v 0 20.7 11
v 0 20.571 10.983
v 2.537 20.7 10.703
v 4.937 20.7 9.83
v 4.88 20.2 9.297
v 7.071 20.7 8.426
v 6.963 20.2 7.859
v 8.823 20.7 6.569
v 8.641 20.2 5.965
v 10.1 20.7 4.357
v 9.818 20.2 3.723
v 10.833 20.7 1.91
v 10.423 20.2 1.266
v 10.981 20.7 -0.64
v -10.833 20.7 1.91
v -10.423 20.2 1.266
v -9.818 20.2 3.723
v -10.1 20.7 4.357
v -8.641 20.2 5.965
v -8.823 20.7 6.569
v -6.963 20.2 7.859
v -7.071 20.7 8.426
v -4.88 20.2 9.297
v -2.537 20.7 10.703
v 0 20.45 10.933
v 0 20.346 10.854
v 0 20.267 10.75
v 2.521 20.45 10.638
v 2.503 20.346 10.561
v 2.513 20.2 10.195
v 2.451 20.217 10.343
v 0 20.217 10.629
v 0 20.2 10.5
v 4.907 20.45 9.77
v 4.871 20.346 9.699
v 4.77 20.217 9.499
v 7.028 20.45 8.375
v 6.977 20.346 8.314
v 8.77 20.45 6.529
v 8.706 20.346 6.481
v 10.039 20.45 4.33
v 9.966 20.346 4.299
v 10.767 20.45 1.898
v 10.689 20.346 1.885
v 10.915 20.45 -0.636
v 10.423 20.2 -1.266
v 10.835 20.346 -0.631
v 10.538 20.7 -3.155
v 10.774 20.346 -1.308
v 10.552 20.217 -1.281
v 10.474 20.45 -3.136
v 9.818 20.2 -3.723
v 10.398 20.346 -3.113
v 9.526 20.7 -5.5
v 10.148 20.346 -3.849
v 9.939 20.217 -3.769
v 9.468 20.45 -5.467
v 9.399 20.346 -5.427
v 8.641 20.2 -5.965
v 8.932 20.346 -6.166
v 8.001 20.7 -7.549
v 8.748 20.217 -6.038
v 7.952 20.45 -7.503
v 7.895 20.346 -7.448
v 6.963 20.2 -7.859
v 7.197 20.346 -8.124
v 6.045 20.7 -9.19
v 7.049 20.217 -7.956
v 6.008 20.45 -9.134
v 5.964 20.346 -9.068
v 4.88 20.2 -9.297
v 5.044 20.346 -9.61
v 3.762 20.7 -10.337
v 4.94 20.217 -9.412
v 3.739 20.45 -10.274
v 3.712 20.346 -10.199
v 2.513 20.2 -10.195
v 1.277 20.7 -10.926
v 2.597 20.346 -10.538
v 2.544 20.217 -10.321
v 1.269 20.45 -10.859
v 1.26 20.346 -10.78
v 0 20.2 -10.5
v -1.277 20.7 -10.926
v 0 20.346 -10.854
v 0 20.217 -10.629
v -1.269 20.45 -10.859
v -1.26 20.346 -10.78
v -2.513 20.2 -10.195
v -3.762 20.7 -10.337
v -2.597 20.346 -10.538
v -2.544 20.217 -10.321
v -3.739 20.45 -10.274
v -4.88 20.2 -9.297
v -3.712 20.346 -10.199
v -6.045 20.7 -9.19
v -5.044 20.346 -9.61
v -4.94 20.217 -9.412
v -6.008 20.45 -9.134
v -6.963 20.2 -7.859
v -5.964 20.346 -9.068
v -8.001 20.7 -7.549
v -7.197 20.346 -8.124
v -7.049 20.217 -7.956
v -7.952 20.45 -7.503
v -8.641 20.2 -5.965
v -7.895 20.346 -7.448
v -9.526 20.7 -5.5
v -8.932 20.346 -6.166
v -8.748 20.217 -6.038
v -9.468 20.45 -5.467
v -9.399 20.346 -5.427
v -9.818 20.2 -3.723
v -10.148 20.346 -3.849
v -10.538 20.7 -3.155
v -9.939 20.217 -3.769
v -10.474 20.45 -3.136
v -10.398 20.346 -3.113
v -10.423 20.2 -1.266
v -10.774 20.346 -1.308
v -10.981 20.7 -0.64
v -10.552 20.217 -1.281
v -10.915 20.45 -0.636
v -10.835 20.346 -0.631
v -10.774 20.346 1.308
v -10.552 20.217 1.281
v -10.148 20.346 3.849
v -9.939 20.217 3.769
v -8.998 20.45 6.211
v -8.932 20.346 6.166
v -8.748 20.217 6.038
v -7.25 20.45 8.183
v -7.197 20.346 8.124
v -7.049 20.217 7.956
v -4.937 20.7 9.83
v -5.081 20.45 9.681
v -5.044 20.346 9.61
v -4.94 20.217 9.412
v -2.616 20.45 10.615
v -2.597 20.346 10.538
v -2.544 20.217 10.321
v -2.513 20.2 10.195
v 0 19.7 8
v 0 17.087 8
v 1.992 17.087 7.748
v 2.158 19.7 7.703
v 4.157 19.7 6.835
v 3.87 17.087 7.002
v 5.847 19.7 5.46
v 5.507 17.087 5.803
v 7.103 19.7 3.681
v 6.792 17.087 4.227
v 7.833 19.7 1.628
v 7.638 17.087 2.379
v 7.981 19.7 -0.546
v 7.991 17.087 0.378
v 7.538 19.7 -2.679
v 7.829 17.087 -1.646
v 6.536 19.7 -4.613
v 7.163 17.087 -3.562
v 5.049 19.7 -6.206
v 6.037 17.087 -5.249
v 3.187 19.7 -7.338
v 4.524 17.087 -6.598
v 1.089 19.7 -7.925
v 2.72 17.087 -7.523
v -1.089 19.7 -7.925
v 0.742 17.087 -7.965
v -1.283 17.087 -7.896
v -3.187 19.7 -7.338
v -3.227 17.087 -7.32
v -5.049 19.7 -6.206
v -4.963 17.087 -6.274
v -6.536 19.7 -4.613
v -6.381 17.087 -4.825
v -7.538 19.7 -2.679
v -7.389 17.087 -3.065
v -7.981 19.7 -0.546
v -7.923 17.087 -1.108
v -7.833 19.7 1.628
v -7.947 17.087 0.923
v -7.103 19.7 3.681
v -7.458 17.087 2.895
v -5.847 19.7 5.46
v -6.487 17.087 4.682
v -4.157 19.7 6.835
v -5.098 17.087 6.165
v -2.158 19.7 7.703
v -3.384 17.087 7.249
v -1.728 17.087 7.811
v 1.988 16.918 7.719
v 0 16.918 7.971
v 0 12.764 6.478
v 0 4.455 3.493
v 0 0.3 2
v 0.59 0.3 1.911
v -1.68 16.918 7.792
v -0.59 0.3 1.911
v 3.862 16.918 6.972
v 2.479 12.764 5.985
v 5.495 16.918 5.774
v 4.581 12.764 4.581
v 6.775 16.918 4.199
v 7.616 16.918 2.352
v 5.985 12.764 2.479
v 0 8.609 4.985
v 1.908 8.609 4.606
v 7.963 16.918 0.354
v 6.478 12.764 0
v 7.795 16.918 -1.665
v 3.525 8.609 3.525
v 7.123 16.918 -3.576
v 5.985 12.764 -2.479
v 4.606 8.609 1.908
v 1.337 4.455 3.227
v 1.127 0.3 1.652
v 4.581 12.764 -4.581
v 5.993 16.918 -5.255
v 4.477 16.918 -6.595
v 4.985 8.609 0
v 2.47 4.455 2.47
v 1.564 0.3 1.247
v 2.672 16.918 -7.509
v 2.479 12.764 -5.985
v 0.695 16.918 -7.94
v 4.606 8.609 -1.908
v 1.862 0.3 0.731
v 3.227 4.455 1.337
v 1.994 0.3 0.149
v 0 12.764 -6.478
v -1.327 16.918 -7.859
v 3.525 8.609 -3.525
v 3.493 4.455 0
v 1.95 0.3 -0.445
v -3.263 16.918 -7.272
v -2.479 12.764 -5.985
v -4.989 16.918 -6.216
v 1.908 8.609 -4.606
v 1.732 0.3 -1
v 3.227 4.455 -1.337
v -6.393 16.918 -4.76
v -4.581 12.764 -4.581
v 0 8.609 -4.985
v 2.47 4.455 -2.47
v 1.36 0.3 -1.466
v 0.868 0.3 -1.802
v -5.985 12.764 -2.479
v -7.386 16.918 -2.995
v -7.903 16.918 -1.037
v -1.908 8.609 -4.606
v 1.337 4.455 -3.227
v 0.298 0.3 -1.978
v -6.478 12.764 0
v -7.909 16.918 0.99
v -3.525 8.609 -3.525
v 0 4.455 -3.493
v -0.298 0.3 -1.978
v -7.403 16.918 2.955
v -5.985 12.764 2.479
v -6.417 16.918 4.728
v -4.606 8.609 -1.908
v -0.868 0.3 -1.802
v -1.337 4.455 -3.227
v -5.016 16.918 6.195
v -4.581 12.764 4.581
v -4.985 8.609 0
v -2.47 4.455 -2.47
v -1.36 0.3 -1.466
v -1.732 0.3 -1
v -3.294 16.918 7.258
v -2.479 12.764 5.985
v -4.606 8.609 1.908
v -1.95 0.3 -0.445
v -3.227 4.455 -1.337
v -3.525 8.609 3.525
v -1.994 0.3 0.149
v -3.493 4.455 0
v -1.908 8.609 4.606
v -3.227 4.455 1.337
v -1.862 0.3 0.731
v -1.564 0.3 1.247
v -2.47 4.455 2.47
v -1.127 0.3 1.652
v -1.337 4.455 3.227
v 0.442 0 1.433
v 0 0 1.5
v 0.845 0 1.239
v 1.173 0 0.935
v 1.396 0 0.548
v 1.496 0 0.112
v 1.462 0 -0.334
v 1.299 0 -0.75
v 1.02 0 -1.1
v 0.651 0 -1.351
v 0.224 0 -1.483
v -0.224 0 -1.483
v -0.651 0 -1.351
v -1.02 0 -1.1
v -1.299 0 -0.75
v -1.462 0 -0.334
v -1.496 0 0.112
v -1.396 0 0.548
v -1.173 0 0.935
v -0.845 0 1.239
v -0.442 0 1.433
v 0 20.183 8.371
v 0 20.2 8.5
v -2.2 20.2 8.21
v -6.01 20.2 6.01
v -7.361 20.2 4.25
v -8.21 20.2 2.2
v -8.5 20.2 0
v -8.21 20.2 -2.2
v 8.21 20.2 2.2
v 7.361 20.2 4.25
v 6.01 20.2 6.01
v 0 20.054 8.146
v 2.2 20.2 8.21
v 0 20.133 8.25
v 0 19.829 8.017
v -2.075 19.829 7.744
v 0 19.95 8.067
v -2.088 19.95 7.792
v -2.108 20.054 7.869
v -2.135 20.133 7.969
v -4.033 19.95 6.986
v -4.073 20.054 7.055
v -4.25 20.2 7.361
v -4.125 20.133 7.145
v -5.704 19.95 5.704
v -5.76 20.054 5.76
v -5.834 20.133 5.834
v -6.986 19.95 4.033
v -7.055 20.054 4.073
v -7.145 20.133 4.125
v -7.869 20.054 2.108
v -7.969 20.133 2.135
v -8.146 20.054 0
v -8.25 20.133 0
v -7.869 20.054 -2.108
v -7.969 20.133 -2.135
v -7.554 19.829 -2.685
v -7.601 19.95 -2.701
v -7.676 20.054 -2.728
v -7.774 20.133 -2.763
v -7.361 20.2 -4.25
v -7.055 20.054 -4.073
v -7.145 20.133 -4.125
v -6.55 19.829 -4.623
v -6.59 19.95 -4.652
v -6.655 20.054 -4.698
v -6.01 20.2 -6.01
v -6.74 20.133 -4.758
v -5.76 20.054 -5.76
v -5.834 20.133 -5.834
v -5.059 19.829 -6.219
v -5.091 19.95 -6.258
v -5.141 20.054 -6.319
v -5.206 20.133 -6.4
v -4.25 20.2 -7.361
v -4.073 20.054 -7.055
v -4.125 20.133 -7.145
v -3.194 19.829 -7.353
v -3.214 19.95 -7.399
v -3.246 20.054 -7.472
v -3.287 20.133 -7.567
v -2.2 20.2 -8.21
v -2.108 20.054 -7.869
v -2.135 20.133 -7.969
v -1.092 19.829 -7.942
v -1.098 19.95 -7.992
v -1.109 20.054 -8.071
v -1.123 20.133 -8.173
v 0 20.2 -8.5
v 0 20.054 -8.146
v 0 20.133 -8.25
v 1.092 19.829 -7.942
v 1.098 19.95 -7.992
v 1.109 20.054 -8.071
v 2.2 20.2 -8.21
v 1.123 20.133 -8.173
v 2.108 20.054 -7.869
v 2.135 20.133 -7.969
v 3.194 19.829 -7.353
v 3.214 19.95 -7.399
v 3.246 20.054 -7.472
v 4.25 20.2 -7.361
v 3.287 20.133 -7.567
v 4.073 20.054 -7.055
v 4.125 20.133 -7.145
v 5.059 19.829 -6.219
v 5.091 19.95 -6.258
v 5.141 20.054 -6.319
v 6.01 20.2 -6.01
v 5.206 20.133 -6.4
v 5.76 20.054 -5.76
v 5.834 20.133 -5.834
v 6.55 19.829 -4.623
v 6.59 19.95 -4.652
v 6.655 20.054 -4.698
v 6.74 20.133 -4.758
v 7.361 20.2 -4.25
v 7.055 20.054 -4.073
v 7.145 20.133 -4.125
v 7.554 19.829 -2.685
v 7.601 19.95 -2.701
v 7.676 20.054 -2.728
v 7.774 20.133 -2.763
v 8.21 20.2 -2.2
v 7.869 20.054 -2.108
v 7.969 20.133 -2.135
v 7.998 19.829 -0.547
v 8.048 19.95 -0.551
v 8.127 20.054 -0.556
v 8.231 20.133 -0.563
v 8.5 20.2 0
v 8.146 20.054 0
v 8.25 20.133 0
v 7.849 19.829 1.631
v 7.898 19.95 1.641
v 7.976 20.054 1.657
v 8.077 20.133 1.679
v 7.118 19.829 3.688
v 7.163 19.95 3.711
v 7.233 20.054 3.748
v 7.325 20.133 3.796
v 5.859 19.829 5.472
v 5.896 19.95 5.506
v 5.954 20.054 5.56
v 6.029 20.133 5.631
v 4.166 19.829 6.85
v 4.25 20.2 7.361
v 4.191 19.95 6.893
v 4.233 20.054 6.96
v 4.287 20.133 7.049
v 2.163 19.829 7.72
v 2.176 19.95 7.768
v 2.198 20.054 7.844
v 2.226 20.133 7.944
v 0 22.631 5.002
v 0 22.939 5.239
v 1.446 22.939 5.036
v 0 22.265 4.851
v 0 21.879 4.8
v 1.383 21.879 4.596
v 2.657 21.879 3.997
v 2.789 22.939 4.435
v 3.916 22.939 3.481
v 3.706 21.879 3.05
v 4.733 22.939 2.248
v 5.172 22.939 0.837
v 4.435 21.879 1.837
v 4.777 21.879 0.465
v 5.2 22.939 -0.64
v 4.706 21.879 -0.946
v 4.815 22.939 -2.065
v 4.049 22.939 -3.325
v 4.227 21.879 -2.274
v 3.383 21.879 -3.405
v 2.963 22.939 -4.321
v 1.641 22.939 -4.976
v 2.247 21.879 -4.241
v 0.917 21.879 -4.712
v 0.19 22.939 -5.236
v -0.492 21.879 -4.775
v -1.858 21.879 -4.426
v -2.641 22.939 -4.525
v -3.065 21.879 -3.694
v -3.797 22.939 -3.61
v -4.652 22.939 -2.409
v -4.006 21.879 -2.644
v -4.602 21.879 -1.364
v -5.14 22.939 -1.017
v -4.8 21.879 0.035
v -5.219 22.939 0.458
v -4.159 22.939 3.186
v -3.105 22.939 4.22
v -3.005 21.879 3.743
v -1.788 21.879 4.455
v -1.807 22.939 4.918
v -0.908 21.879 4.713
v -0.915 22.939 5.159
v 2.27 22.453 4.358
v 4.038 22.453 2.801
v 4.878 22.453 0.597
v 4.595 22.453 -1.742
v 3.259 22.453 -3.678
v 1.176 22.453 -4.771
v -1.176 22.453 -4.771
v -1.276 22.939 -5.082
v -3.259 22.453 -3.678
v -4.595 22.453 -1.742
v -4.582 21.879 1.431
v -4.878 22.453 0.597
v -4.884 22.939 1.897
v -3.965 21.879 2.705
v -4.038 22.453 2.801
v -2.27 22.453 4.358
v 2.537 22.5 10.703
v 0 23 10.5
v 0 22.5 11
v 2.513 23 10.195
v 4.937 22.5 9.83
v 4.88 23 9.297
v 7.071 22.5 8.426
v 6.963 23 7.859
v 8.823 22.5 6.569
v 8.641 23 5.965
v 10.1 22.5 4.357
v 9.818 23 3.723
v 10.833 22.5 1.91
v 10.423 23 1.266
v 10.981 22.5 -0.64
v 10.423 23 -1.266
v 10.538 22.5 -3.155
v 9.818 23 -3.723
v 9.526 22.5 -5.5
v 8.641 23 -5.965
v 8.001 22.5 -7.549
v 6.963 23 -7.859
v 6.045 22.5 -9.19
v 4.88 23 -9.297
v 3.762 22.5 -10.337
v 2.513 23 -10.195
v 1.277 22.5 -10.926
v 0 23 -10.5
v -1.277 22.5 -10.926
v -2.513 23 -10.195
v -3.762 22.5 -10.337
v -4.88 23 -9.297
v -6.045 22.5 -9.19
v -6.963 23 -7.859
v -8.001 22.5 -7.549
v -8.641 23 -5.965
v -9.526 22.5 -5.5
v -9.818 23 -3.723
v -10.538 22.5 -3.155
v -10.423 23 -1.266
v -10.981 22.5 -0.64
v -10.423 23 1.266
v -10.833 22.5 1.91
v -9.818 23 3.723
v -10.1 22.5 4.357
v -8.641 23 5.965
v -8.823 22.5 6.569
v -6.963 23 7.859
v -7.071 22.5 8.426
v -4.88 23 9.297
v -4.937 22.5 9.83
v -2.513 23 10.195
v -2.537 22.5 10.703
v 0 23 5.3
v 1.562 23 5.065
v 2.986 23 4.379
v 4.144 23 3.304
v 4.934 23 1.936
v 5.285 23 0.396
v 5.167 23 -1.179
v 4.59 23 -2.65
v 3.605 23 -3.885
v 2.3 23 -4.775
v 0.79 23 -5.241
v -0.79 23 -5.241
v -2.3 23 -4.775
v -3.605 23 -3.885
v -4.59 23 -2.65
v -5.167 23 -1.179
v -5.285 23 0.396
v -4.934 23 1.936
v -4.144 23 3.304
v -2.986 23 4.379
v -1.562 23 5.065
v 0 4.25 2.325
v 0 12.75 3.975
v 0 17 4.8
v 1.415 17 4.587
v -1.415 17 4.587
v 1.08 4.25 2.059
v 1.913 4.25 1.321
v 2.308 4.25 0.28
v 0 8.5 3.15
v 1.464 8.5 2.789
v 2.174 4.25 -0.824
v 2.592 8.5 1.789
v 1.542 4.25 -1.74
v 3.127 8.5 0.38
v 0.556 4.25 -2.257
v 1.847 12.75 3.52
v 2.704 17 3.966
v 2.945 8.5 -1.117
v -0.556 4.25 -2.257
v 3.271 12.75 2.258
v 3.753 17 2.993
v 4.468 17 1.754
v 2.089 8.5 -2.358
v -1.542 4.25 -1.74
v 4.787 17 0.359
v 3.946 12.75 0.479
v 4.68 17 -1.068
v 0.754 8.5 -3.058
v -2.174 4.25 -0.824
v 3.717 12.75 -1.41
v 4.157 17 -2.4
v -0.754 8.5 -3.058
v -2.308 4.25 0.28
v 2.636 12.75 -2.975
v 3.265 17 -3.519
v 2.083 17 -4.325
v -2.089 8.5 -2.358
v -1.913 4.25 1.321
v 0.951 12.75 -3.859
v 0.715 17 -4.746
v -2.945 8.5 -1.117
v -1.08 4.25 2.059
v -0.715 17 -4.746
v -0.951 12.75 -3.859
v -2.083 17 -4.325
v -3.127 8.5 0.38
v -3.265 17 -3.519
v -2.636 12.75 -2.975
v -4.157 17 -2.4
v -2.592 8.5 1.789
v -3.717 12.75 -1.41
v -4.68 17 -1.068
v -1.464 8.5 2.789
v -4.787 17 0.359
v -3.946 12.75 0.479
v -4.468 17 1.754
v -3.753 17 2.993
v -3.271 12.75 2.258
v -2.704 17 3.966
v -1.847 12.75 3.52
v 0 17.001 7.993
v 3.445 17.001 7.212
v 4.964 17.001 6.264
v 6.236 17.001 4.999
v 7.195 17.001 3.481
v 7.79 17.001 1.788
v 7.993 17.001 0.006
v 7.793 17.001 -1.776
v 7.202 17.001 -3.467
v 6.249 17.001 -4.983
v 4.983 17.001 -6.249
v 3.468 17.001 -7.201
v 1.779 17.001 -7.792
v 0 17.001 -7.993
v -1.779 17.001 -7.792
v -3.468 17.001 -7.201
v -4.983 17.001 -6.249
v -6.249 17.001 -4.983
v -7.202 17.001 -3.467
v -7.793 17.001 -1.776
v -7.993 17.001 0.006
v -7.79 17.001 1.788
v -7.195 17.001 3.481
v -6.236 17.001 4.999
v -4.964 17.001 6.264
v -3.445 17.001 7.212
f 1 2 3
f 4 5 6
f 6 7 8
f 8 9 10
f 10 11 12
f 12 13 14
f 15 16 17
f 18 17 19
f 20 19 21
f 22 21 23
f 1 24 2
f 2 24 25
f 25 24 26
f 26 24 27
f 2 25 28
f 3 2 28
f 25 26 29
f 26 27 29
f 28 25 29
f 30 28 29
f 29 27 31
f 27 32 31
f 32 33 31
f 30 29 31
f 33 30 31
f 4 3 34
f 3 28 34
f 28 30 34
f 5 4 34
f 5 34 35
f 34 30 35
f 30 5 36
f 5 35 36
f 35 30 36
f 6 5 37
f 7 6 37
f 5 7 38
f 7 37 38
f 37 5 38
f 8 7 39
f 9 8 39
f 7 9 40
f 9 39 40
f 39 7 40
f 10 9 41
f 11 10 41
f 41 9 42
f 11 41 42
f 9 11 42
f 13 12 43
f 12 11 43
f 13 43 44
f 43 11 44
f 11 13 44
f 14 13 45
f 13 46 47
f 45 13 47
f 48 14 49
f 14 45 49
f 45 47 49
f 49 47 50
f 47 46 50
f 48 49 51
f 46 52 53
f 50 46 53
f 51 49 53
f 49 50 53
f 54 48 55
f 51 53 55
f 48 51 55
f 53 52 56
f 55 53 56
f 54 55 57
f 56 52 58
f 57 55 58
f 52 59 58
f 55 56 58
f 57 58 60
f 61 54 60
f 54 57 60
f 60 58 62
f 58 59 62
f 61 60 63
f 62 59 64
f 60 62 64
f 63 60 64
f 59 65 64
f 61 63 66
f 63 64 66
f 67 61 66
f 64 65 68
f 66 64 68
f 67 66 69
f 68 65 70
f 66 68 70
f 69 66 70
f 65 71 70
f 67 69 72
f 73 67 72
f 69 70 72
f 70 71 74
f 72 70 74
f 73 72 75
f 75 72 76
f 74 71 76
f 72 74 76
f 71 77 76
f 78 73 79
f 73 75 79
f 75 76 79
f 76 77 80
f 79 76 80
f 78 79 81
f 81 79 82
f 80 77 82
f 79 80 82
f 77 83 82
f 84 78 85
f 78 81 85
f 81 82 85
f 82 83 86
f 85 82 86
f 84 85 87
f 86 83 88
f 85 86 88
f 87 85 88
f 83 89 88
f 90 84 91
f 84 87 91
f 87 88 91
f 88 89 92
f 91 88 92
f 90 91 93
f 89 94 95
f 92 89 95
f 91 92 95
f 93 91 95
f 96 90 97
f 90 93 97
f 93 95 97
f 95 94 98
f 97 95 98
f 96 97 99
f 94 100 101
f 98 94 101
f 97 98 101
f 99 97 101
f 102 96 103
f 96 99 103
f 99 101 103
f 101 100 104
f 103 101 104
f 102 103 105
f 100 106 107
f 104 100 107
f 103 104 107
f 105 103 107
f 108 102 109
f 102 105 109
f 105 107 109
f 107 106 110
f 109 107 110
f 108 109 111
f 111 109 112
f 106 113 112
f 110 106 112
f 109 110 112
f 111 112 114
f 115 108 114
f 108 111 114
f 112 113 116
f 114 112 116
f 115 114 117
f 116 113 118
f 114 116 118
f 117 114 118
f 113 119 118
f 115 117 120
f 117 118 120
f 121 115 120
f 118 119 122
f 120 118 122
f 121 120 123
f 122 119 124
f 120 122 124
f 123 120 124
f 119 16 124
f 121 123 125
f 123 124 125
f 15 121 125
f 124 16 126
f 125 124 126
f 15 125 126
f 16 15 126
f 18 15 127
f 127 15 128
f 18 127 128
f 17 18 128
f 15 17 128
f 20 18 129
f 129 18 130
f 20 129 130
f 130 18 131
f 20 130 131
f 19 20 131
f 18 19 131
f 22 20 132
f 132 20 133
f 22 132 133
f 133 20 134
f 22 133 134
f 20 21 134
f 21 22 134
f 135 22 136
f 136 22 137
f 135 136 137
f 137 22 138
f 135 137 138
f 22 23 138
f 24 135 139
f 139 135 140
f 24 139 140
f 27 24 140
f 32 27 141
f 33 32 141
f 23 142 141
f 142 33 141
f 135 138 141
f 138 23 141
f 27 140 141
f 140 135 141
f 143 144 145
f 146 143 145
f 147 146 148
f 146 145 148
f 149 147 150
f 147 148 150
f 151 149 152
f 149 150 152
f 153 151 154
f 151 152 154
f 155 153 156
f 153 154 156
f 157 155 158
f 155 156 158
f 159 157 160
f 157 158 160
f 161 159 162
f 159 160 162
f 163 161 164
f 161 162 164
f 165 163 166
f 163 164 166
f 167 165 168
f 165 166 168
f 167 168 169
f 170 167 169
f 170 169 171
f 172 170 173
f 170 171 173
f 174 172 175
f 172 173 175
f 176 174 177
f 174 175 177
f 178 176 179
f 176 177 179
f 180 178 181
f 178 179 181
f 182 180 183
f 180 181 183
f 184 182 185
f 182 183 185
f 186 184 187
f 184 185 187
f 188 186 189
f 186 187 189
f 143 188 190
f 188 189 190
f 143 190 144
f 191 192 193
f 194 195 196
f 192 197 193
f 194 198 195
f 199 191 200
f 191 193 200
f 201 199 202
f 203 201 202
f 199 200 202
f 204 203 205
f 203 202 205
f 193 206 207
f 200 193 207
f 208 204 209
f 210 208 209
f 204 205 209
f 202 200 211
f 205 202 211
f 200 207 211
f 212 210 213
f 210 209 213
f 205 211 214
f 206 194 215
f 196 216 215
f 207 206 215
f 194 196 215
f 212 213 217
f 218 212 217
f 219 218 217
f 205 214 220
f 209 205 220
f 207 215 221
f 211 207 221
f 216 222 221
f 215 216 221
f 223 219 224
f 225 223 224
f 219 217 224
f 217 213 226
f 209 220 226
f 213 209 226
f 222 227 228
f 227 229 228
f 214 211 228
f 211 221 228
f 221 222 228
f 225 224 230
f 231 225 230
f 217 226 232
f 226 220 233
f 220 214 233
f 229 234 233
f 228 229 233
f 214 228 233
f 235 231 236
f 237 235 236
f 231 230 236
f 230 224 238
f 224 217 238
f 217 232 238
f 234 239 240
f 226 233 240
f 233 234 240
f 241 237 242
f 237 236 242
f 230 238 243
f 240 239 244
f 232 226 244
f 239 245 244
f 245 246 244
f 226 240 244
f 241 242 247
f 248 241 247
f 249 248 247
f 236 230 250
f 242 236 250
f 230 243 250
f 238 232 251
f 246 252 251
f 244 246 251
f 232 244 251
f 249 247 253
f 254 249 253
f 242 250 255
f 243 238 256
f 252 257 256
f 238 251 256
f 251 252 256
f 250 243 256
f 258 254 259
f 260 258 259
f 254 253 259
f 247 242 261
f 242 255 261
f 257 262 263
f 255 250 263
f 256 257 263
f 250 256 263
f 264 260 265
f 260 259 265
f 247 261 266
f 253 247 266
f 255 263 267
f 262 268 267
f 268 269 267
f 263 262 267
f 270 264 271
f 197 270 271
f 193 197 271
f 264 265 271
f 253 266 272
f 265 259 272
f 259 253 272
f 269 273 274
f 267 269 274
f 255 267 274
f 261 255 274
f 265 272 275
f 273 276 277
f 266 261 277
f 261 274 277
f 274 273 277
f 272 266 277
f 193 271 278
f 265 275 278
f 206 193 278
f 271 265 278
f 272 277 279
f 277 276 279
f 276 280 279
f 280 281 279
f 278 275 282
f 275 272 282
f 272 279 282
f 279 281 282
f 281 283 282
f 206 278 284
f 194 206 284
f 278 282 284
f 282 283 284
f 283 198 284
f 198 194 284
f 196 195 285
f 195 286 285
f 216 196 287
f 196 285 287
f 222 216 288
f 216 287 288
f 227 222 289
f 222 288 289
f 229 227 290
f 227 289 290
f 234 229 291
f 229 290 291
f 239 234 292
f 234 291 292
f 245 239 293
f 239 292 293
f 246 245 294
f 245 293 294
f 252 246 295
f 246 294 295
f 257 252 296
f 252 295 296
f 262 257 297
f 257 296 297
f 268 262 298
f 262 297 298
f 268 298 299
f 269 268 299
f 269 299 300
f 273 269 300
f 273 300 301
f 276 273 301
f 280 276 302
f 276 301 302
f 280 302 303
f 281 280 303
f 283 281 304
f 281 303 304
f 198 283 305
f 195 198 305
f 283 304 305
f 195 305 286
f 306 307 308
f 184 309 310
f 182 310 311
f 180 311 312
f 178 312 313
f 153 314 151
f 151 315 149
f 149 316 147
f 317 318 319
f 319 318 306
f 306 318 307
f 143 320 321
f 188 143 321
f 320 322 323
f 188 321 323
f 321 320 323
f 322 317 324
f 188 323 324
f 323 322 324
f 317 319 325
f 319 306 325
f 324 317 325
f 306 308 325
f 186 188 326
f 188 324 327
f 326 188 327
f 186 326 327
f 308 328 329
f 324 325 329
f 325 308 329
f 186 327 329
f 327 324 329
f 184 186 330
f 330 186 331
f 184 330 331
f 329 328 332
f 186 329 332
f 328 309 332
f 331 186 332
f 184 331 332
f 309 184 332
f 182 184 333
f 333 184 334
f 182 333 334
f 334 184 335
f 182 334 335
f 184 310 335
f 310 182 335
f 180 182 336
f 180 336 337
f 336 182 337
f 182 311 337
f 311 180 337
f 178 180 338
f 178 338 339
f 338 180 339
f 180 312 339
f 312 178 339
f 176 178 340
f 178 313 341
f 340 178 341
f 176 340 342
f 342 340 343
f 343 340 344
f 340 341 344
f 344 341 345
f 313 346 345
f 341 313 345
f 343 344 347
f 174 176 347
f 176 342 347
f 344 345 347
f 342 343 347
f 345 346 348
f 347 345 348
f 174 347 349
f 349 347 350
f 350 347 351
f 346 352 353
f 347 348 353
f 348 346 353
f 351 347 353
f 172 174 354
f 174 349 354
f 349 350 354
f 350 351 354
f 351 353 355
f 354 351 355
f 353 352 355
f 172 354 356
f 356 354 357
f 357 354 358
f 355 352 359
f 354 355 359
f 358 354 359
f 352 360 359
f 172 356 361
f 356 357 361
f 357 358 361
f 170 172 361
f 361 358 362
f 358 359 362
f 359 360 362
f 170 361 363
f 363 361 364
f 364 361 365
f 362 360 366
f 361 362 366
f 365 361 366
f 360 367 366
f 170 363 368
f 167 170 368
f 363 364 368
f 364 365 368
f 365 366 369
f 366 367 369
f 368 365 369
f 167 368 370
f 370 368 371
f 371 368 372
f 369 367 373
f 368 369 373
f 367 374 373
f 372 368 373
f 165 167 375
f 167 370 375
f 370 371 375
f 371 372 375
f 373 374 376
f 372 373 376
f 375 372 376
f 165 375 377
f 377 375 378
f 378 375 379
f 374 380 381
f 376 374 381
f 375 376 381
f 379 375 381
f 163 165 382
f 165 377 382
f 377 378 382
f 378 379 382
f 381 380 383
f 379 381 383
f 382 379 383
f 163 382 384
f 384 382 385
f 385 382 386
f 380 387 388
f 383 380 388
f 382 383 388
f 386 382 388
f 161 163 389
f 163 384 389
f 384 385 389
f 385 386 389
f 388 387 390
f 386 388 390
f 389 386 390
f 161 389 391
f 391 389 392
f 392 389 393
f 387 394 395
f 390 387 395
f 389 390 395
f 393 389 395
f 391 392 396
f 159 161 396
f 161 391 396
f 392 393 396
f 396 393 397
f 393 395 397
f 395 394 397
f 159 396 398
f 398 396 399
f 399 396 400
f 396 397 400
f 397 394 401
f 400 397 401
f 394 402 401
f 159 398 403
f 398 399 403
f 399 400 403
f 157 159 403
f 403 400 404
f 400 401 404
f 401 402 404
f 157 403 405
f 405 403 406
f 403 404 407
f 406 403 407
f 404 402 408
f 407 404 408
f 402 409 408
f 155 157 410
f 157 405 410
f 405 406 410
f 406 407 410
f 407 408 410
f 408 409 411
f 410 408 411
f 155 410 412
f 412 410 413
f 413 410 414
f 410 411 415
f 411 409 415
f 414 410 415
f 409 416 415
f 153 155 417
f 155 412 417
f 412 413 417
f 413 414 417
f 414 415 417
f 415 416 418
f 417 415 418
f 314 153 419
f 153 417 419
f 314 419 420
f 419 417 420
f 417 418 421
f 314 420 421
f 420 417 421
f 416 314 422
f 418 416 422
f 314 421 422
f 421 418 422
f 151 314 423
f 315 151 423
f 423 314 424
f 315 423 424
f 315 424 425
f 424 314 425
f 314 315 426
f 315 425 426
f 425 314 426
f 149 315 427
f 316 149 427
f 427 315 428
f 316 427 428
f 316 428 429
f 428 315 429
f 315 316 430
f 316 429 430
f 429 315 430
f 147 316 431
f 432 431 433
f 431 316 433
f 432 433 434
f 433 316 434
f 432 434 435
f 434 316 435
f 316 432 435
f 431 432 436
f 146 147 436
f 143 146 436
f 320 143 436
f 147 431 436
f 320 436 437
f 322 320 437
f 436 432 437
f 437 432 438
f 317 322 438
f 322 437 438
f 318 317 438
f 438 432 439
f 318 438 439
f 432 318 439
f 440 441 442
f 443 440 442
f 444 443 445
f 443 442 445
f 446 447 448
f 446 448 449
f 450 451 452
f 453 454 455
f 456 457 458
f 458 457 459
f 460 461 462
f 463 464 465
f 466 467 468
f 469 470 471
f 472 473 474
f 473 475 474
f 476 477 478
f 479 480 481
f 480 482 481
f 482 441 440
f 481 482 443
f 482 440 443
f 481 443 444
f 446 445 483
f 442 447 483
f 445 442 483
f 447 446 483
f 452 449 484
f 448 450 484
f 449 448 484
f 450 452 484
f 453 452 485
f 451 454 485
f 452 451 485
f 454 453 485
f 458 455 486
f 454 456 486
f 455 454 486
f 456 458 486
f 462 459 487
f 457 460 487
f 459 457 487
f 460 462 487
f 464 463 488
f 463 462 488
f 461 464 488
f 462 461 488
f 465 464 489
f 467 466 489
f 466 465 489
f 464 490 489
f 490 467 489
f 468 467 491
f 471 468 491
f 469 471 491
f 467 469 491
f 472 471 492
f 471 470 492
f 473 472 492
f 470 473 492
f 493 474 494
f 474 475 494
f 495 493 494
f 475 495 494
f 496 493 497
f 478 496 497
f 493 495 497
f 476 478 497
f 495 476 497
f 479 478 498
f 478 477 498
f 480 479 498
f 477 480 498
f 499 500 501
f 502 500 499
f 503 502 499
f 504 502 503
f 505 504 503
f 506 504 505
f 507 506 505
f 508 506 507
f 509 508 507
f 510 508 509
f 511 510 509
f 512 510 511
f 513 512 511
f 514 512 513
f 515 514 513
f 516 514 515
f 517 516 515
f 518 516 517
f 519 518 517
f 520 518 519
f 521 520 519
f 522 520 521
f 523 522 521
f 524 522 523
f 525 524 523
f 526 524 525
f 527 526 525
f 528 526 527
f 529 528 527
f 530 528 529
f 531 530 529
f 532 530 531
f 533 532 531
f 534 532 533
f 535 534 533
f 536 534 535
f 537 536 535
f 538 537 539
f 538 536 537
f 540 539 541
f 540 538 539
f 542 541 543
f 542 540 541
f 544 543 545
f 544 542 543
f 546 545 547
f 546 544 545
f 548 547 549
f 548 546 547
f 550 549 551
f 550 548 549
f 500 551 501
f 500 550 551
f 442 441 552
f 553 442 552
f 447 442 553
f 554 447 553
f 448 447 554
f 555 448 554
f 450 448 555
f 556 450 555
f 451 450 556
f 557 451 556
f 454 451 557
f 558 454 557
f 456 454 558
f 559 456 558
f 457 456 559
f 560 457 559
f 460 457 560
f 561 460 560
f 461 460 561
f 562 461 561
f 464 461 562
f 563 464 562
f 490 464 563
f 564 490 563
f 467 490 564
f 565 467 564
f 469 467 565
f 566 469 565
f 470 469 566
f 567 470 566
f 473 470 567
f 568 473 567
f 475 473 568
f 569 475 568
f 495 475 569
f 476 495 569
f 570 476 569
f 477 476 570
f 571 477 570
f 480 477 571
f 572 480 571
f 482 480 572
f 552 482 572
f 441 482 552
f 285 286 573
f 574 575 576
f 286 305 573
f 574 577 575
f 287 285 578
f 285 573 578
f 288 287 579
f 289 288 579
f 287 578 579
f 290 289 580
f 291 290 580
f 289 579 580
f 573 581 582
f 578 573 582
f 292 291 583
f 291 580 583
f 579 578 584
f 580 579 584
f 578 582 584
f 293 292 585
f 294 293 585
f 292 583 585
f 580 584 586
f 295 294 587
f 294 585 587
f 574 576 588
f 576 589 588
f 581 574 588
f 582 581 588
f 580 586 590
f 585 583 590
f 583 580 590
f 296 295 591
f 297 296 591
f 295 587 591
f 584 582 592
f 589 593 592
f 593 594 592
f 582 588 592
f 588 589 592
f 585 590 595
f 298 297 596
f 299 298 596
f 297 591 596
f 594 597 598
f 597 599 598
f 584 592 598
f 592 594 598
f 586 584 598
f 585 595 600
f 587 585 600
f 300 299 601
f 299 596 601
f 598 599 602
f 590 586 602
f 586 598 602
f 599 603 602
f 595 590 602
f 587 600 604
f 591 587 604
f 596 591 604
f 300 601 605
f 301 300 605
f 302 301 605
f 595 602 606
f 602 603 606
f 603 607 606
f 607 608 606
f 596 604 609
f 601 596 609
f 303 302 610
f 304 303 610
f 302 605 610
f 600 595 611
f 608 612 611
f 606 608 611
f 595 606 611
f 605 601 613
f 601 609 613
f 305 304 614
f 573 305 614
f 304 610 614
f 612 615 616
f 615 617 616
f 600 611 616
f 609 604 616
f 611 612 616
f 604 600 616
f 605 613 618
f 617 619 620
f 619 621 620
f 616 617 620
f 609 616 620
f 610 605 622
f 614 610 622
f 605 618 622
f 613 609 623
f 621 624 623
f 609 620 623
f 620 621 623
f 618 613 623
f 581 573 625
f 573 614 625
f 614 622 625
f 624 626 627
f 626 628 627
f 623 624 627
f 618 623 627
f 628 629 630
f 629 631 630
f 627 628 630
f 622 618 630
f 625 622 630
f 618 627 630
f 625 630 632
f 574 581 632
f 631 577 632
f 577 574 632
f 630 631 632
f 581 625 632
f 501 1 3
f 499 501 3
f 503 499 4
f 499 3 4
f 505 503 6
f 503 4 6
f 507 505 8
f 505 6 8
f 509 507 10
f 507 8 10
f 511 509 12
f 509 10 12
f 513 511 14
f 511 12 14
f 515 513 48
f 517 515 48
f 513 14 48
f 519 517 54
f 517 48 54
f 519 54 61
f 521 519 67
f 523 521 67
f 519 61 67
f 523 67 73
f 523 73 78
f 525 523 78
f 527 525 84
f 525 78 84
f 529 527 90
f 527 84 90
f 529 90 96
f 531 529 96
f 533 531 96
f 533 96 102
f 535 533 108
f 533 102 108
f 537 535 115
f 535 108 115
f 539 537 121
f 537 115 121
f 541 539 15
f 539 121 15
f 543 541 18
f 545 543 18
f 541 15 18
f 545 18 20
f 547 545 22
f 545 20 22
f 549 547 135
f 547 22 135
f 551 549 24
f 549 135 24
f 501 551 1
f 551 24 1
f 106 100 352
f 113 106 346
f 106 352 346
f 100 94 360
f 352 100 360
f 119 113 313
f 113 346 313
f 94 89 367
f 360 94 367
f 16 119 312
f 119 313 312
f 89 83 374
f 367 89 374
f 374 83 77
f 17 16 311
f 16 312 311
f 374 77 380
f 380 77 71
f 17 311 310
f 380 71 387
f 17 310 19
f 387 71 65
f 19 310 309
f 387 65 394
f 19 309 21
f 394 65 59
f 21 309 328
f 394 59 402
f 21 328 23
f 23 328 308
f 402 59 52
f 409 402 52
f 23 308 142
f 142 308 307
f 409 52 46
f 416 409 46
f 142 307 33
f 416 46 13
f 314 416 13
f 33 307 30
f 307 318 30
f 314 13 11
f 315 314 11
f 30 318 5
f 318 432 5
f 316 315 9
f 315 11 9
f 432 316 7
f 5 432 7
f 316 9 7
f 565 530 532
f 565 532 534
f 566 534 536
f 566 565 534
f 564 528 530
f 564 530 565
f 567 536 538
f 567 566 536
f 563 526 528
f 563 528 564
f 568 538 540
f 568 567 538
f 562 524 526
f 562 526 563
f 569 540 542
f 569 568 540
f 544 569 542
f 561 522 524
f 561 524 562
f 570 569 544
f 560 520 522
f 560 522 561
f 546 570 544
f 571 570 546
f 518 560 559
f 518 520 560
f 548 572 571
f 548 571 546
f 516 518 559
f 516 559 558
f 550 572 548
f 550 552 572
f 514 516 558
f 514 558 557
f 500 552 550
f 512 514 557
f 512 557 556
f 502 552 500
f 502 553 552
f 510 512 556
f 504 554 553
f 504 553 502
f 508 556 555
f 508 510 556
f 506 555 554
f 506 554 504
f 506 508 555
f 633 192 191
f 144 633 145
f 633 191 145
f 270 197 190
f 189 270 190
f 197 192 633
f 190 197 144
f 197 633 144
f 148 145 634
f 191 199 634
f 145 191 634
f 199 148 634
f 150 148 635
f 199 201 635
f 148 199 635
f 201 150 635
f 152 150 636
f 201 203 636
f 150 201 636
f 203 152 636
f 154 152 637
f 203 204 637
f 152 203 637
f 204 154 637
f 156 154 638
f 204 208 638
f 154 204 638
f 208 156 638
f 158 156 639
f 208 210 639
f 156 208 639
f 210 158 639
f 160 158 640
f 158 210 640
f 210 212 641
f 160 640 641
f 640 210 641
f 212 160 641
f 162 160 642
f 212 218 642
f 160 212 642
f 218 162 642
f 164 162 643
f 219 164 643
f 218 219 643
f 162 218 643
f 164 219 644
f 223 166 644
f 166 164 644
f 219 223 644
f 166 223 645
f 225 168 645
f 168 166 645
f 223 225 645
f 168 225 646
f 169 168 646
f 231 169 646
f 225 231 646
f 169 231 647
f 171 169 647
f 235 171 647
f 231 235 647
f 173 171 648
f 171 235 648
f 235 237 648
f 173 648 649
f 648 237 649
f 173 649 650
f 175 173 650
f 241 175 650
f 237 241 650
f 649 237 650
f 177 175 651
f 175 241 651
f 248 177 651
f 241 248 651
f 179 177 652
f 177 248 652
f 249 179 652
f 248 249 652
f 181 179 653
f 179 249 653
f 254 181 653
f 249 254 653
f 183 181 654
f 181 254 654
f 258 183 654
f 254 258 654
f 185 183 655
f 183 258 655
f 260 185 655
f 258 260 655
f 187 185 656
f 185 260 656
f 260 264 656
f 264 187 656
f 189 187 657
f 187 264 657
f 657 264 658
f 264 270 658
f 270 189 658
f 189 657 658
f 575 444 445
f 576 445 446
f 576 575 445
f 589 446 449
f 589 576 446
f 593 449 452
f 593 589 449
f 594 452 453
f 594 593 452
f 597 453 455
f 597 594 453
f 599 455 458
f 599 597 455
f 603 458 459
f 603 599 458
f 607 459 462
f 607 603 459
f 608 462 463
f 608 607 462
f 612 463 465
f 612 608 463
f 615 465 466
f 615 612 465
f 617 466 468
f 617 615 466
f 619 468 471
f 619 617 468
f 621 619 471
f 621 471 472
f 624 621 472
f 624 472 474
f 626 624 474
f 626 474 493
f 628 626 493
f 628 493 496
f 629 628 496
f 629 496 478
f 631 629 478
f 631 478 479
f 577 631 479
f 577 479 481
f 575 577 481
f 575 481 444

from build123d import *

# Parameters (mm, degrees)
FL_CHE_VERSCHIEBEN1_BY          = 1
AUFSATZ_LINEAR_START            = -2.8
SKIZZE2_R                       = 11
SKIZZE2_R_2                     = 4.8
AUFSATZ_LINEAR_AUSTRAGEN1_DEPTH = 2.8
VERRUNDUNG1_R                   = 0.5
FASE1_SIZE                      = 0.5
VERRUNDUNG2_R                   = 1.5


with BuildPart() as part:
    # Skizze1 → Rotation1 (revolve)
    with BuildSketch(Plane.XY, mode=Mode.PRIVATE) as rotation1_sk:
        Polygon((1.5, 0), (4.8, 17), (4.8, 22), (8, 22), (8, 17), (2, 0.3), align=None)
    revolve(rotation1_sk.sketch.rotate(Axis((0, 0, 0), (0, 1, 0)), 270), axis=Axis((0, 0, 0), (0, 1, 0)))

    # Fläche verschieben1: a face moved outward by 1.0
    extrude(part.faces().sort_by_distance((-6.4, 22, 0))[0], amount=FL_CHE_VERSCHIEBEN1_BY, dir=(0, 1, 0))

    # Skizze2 → Aufsatz-Linear austragen1 (add)
    with BuildSketch(Plane(origin=(0, 23, 0), x_dir=(1, 0, 0), z_dir=(0, 1, 0)).offset(AUFSATZ_LINEAR_START)):
        with Locations(Location((0, 0, 0), (0, 0, 270))):
            Circle(SKIZZE2_R)
        with Locations(Location((0, 0, 0), (0, 0, 270))):
            Circle(SKIZZE2_R_2, mode=Mode.SUBTRACT)
    extrude(amount=AUFSATZ_LINEAR_AUSTRAGEN1_DEPTH)

    # Verrundung1
    verrundung1_edges = [part.edges().sort_by_distance(p)[0] for p in [
        (0, 20.2, -8),
        (0, 20.2, -11),
        (0, 17, -8),
    ]]
    fillet(verrundung1_edges, radius=VERRUNDUNG1_R)

    # Fase1
    fase1_edges = [part.edges().sort_by_distance(p)[0] for p in [
        (0, 23, -11),
        (0, 23, -4.8),
    ]]
    chamfer(fase1_edges, length=FASE1_SIZE)

    # Verrundung2
    verrundung2_edges = [part.edges().sort_by_distance(p)[0] for p in [
        (0, 22.5, -4.8),
    ]]
    fillet(verrundung2_edges, radius=VERRUNDUNG2_R)


solid = part.part
